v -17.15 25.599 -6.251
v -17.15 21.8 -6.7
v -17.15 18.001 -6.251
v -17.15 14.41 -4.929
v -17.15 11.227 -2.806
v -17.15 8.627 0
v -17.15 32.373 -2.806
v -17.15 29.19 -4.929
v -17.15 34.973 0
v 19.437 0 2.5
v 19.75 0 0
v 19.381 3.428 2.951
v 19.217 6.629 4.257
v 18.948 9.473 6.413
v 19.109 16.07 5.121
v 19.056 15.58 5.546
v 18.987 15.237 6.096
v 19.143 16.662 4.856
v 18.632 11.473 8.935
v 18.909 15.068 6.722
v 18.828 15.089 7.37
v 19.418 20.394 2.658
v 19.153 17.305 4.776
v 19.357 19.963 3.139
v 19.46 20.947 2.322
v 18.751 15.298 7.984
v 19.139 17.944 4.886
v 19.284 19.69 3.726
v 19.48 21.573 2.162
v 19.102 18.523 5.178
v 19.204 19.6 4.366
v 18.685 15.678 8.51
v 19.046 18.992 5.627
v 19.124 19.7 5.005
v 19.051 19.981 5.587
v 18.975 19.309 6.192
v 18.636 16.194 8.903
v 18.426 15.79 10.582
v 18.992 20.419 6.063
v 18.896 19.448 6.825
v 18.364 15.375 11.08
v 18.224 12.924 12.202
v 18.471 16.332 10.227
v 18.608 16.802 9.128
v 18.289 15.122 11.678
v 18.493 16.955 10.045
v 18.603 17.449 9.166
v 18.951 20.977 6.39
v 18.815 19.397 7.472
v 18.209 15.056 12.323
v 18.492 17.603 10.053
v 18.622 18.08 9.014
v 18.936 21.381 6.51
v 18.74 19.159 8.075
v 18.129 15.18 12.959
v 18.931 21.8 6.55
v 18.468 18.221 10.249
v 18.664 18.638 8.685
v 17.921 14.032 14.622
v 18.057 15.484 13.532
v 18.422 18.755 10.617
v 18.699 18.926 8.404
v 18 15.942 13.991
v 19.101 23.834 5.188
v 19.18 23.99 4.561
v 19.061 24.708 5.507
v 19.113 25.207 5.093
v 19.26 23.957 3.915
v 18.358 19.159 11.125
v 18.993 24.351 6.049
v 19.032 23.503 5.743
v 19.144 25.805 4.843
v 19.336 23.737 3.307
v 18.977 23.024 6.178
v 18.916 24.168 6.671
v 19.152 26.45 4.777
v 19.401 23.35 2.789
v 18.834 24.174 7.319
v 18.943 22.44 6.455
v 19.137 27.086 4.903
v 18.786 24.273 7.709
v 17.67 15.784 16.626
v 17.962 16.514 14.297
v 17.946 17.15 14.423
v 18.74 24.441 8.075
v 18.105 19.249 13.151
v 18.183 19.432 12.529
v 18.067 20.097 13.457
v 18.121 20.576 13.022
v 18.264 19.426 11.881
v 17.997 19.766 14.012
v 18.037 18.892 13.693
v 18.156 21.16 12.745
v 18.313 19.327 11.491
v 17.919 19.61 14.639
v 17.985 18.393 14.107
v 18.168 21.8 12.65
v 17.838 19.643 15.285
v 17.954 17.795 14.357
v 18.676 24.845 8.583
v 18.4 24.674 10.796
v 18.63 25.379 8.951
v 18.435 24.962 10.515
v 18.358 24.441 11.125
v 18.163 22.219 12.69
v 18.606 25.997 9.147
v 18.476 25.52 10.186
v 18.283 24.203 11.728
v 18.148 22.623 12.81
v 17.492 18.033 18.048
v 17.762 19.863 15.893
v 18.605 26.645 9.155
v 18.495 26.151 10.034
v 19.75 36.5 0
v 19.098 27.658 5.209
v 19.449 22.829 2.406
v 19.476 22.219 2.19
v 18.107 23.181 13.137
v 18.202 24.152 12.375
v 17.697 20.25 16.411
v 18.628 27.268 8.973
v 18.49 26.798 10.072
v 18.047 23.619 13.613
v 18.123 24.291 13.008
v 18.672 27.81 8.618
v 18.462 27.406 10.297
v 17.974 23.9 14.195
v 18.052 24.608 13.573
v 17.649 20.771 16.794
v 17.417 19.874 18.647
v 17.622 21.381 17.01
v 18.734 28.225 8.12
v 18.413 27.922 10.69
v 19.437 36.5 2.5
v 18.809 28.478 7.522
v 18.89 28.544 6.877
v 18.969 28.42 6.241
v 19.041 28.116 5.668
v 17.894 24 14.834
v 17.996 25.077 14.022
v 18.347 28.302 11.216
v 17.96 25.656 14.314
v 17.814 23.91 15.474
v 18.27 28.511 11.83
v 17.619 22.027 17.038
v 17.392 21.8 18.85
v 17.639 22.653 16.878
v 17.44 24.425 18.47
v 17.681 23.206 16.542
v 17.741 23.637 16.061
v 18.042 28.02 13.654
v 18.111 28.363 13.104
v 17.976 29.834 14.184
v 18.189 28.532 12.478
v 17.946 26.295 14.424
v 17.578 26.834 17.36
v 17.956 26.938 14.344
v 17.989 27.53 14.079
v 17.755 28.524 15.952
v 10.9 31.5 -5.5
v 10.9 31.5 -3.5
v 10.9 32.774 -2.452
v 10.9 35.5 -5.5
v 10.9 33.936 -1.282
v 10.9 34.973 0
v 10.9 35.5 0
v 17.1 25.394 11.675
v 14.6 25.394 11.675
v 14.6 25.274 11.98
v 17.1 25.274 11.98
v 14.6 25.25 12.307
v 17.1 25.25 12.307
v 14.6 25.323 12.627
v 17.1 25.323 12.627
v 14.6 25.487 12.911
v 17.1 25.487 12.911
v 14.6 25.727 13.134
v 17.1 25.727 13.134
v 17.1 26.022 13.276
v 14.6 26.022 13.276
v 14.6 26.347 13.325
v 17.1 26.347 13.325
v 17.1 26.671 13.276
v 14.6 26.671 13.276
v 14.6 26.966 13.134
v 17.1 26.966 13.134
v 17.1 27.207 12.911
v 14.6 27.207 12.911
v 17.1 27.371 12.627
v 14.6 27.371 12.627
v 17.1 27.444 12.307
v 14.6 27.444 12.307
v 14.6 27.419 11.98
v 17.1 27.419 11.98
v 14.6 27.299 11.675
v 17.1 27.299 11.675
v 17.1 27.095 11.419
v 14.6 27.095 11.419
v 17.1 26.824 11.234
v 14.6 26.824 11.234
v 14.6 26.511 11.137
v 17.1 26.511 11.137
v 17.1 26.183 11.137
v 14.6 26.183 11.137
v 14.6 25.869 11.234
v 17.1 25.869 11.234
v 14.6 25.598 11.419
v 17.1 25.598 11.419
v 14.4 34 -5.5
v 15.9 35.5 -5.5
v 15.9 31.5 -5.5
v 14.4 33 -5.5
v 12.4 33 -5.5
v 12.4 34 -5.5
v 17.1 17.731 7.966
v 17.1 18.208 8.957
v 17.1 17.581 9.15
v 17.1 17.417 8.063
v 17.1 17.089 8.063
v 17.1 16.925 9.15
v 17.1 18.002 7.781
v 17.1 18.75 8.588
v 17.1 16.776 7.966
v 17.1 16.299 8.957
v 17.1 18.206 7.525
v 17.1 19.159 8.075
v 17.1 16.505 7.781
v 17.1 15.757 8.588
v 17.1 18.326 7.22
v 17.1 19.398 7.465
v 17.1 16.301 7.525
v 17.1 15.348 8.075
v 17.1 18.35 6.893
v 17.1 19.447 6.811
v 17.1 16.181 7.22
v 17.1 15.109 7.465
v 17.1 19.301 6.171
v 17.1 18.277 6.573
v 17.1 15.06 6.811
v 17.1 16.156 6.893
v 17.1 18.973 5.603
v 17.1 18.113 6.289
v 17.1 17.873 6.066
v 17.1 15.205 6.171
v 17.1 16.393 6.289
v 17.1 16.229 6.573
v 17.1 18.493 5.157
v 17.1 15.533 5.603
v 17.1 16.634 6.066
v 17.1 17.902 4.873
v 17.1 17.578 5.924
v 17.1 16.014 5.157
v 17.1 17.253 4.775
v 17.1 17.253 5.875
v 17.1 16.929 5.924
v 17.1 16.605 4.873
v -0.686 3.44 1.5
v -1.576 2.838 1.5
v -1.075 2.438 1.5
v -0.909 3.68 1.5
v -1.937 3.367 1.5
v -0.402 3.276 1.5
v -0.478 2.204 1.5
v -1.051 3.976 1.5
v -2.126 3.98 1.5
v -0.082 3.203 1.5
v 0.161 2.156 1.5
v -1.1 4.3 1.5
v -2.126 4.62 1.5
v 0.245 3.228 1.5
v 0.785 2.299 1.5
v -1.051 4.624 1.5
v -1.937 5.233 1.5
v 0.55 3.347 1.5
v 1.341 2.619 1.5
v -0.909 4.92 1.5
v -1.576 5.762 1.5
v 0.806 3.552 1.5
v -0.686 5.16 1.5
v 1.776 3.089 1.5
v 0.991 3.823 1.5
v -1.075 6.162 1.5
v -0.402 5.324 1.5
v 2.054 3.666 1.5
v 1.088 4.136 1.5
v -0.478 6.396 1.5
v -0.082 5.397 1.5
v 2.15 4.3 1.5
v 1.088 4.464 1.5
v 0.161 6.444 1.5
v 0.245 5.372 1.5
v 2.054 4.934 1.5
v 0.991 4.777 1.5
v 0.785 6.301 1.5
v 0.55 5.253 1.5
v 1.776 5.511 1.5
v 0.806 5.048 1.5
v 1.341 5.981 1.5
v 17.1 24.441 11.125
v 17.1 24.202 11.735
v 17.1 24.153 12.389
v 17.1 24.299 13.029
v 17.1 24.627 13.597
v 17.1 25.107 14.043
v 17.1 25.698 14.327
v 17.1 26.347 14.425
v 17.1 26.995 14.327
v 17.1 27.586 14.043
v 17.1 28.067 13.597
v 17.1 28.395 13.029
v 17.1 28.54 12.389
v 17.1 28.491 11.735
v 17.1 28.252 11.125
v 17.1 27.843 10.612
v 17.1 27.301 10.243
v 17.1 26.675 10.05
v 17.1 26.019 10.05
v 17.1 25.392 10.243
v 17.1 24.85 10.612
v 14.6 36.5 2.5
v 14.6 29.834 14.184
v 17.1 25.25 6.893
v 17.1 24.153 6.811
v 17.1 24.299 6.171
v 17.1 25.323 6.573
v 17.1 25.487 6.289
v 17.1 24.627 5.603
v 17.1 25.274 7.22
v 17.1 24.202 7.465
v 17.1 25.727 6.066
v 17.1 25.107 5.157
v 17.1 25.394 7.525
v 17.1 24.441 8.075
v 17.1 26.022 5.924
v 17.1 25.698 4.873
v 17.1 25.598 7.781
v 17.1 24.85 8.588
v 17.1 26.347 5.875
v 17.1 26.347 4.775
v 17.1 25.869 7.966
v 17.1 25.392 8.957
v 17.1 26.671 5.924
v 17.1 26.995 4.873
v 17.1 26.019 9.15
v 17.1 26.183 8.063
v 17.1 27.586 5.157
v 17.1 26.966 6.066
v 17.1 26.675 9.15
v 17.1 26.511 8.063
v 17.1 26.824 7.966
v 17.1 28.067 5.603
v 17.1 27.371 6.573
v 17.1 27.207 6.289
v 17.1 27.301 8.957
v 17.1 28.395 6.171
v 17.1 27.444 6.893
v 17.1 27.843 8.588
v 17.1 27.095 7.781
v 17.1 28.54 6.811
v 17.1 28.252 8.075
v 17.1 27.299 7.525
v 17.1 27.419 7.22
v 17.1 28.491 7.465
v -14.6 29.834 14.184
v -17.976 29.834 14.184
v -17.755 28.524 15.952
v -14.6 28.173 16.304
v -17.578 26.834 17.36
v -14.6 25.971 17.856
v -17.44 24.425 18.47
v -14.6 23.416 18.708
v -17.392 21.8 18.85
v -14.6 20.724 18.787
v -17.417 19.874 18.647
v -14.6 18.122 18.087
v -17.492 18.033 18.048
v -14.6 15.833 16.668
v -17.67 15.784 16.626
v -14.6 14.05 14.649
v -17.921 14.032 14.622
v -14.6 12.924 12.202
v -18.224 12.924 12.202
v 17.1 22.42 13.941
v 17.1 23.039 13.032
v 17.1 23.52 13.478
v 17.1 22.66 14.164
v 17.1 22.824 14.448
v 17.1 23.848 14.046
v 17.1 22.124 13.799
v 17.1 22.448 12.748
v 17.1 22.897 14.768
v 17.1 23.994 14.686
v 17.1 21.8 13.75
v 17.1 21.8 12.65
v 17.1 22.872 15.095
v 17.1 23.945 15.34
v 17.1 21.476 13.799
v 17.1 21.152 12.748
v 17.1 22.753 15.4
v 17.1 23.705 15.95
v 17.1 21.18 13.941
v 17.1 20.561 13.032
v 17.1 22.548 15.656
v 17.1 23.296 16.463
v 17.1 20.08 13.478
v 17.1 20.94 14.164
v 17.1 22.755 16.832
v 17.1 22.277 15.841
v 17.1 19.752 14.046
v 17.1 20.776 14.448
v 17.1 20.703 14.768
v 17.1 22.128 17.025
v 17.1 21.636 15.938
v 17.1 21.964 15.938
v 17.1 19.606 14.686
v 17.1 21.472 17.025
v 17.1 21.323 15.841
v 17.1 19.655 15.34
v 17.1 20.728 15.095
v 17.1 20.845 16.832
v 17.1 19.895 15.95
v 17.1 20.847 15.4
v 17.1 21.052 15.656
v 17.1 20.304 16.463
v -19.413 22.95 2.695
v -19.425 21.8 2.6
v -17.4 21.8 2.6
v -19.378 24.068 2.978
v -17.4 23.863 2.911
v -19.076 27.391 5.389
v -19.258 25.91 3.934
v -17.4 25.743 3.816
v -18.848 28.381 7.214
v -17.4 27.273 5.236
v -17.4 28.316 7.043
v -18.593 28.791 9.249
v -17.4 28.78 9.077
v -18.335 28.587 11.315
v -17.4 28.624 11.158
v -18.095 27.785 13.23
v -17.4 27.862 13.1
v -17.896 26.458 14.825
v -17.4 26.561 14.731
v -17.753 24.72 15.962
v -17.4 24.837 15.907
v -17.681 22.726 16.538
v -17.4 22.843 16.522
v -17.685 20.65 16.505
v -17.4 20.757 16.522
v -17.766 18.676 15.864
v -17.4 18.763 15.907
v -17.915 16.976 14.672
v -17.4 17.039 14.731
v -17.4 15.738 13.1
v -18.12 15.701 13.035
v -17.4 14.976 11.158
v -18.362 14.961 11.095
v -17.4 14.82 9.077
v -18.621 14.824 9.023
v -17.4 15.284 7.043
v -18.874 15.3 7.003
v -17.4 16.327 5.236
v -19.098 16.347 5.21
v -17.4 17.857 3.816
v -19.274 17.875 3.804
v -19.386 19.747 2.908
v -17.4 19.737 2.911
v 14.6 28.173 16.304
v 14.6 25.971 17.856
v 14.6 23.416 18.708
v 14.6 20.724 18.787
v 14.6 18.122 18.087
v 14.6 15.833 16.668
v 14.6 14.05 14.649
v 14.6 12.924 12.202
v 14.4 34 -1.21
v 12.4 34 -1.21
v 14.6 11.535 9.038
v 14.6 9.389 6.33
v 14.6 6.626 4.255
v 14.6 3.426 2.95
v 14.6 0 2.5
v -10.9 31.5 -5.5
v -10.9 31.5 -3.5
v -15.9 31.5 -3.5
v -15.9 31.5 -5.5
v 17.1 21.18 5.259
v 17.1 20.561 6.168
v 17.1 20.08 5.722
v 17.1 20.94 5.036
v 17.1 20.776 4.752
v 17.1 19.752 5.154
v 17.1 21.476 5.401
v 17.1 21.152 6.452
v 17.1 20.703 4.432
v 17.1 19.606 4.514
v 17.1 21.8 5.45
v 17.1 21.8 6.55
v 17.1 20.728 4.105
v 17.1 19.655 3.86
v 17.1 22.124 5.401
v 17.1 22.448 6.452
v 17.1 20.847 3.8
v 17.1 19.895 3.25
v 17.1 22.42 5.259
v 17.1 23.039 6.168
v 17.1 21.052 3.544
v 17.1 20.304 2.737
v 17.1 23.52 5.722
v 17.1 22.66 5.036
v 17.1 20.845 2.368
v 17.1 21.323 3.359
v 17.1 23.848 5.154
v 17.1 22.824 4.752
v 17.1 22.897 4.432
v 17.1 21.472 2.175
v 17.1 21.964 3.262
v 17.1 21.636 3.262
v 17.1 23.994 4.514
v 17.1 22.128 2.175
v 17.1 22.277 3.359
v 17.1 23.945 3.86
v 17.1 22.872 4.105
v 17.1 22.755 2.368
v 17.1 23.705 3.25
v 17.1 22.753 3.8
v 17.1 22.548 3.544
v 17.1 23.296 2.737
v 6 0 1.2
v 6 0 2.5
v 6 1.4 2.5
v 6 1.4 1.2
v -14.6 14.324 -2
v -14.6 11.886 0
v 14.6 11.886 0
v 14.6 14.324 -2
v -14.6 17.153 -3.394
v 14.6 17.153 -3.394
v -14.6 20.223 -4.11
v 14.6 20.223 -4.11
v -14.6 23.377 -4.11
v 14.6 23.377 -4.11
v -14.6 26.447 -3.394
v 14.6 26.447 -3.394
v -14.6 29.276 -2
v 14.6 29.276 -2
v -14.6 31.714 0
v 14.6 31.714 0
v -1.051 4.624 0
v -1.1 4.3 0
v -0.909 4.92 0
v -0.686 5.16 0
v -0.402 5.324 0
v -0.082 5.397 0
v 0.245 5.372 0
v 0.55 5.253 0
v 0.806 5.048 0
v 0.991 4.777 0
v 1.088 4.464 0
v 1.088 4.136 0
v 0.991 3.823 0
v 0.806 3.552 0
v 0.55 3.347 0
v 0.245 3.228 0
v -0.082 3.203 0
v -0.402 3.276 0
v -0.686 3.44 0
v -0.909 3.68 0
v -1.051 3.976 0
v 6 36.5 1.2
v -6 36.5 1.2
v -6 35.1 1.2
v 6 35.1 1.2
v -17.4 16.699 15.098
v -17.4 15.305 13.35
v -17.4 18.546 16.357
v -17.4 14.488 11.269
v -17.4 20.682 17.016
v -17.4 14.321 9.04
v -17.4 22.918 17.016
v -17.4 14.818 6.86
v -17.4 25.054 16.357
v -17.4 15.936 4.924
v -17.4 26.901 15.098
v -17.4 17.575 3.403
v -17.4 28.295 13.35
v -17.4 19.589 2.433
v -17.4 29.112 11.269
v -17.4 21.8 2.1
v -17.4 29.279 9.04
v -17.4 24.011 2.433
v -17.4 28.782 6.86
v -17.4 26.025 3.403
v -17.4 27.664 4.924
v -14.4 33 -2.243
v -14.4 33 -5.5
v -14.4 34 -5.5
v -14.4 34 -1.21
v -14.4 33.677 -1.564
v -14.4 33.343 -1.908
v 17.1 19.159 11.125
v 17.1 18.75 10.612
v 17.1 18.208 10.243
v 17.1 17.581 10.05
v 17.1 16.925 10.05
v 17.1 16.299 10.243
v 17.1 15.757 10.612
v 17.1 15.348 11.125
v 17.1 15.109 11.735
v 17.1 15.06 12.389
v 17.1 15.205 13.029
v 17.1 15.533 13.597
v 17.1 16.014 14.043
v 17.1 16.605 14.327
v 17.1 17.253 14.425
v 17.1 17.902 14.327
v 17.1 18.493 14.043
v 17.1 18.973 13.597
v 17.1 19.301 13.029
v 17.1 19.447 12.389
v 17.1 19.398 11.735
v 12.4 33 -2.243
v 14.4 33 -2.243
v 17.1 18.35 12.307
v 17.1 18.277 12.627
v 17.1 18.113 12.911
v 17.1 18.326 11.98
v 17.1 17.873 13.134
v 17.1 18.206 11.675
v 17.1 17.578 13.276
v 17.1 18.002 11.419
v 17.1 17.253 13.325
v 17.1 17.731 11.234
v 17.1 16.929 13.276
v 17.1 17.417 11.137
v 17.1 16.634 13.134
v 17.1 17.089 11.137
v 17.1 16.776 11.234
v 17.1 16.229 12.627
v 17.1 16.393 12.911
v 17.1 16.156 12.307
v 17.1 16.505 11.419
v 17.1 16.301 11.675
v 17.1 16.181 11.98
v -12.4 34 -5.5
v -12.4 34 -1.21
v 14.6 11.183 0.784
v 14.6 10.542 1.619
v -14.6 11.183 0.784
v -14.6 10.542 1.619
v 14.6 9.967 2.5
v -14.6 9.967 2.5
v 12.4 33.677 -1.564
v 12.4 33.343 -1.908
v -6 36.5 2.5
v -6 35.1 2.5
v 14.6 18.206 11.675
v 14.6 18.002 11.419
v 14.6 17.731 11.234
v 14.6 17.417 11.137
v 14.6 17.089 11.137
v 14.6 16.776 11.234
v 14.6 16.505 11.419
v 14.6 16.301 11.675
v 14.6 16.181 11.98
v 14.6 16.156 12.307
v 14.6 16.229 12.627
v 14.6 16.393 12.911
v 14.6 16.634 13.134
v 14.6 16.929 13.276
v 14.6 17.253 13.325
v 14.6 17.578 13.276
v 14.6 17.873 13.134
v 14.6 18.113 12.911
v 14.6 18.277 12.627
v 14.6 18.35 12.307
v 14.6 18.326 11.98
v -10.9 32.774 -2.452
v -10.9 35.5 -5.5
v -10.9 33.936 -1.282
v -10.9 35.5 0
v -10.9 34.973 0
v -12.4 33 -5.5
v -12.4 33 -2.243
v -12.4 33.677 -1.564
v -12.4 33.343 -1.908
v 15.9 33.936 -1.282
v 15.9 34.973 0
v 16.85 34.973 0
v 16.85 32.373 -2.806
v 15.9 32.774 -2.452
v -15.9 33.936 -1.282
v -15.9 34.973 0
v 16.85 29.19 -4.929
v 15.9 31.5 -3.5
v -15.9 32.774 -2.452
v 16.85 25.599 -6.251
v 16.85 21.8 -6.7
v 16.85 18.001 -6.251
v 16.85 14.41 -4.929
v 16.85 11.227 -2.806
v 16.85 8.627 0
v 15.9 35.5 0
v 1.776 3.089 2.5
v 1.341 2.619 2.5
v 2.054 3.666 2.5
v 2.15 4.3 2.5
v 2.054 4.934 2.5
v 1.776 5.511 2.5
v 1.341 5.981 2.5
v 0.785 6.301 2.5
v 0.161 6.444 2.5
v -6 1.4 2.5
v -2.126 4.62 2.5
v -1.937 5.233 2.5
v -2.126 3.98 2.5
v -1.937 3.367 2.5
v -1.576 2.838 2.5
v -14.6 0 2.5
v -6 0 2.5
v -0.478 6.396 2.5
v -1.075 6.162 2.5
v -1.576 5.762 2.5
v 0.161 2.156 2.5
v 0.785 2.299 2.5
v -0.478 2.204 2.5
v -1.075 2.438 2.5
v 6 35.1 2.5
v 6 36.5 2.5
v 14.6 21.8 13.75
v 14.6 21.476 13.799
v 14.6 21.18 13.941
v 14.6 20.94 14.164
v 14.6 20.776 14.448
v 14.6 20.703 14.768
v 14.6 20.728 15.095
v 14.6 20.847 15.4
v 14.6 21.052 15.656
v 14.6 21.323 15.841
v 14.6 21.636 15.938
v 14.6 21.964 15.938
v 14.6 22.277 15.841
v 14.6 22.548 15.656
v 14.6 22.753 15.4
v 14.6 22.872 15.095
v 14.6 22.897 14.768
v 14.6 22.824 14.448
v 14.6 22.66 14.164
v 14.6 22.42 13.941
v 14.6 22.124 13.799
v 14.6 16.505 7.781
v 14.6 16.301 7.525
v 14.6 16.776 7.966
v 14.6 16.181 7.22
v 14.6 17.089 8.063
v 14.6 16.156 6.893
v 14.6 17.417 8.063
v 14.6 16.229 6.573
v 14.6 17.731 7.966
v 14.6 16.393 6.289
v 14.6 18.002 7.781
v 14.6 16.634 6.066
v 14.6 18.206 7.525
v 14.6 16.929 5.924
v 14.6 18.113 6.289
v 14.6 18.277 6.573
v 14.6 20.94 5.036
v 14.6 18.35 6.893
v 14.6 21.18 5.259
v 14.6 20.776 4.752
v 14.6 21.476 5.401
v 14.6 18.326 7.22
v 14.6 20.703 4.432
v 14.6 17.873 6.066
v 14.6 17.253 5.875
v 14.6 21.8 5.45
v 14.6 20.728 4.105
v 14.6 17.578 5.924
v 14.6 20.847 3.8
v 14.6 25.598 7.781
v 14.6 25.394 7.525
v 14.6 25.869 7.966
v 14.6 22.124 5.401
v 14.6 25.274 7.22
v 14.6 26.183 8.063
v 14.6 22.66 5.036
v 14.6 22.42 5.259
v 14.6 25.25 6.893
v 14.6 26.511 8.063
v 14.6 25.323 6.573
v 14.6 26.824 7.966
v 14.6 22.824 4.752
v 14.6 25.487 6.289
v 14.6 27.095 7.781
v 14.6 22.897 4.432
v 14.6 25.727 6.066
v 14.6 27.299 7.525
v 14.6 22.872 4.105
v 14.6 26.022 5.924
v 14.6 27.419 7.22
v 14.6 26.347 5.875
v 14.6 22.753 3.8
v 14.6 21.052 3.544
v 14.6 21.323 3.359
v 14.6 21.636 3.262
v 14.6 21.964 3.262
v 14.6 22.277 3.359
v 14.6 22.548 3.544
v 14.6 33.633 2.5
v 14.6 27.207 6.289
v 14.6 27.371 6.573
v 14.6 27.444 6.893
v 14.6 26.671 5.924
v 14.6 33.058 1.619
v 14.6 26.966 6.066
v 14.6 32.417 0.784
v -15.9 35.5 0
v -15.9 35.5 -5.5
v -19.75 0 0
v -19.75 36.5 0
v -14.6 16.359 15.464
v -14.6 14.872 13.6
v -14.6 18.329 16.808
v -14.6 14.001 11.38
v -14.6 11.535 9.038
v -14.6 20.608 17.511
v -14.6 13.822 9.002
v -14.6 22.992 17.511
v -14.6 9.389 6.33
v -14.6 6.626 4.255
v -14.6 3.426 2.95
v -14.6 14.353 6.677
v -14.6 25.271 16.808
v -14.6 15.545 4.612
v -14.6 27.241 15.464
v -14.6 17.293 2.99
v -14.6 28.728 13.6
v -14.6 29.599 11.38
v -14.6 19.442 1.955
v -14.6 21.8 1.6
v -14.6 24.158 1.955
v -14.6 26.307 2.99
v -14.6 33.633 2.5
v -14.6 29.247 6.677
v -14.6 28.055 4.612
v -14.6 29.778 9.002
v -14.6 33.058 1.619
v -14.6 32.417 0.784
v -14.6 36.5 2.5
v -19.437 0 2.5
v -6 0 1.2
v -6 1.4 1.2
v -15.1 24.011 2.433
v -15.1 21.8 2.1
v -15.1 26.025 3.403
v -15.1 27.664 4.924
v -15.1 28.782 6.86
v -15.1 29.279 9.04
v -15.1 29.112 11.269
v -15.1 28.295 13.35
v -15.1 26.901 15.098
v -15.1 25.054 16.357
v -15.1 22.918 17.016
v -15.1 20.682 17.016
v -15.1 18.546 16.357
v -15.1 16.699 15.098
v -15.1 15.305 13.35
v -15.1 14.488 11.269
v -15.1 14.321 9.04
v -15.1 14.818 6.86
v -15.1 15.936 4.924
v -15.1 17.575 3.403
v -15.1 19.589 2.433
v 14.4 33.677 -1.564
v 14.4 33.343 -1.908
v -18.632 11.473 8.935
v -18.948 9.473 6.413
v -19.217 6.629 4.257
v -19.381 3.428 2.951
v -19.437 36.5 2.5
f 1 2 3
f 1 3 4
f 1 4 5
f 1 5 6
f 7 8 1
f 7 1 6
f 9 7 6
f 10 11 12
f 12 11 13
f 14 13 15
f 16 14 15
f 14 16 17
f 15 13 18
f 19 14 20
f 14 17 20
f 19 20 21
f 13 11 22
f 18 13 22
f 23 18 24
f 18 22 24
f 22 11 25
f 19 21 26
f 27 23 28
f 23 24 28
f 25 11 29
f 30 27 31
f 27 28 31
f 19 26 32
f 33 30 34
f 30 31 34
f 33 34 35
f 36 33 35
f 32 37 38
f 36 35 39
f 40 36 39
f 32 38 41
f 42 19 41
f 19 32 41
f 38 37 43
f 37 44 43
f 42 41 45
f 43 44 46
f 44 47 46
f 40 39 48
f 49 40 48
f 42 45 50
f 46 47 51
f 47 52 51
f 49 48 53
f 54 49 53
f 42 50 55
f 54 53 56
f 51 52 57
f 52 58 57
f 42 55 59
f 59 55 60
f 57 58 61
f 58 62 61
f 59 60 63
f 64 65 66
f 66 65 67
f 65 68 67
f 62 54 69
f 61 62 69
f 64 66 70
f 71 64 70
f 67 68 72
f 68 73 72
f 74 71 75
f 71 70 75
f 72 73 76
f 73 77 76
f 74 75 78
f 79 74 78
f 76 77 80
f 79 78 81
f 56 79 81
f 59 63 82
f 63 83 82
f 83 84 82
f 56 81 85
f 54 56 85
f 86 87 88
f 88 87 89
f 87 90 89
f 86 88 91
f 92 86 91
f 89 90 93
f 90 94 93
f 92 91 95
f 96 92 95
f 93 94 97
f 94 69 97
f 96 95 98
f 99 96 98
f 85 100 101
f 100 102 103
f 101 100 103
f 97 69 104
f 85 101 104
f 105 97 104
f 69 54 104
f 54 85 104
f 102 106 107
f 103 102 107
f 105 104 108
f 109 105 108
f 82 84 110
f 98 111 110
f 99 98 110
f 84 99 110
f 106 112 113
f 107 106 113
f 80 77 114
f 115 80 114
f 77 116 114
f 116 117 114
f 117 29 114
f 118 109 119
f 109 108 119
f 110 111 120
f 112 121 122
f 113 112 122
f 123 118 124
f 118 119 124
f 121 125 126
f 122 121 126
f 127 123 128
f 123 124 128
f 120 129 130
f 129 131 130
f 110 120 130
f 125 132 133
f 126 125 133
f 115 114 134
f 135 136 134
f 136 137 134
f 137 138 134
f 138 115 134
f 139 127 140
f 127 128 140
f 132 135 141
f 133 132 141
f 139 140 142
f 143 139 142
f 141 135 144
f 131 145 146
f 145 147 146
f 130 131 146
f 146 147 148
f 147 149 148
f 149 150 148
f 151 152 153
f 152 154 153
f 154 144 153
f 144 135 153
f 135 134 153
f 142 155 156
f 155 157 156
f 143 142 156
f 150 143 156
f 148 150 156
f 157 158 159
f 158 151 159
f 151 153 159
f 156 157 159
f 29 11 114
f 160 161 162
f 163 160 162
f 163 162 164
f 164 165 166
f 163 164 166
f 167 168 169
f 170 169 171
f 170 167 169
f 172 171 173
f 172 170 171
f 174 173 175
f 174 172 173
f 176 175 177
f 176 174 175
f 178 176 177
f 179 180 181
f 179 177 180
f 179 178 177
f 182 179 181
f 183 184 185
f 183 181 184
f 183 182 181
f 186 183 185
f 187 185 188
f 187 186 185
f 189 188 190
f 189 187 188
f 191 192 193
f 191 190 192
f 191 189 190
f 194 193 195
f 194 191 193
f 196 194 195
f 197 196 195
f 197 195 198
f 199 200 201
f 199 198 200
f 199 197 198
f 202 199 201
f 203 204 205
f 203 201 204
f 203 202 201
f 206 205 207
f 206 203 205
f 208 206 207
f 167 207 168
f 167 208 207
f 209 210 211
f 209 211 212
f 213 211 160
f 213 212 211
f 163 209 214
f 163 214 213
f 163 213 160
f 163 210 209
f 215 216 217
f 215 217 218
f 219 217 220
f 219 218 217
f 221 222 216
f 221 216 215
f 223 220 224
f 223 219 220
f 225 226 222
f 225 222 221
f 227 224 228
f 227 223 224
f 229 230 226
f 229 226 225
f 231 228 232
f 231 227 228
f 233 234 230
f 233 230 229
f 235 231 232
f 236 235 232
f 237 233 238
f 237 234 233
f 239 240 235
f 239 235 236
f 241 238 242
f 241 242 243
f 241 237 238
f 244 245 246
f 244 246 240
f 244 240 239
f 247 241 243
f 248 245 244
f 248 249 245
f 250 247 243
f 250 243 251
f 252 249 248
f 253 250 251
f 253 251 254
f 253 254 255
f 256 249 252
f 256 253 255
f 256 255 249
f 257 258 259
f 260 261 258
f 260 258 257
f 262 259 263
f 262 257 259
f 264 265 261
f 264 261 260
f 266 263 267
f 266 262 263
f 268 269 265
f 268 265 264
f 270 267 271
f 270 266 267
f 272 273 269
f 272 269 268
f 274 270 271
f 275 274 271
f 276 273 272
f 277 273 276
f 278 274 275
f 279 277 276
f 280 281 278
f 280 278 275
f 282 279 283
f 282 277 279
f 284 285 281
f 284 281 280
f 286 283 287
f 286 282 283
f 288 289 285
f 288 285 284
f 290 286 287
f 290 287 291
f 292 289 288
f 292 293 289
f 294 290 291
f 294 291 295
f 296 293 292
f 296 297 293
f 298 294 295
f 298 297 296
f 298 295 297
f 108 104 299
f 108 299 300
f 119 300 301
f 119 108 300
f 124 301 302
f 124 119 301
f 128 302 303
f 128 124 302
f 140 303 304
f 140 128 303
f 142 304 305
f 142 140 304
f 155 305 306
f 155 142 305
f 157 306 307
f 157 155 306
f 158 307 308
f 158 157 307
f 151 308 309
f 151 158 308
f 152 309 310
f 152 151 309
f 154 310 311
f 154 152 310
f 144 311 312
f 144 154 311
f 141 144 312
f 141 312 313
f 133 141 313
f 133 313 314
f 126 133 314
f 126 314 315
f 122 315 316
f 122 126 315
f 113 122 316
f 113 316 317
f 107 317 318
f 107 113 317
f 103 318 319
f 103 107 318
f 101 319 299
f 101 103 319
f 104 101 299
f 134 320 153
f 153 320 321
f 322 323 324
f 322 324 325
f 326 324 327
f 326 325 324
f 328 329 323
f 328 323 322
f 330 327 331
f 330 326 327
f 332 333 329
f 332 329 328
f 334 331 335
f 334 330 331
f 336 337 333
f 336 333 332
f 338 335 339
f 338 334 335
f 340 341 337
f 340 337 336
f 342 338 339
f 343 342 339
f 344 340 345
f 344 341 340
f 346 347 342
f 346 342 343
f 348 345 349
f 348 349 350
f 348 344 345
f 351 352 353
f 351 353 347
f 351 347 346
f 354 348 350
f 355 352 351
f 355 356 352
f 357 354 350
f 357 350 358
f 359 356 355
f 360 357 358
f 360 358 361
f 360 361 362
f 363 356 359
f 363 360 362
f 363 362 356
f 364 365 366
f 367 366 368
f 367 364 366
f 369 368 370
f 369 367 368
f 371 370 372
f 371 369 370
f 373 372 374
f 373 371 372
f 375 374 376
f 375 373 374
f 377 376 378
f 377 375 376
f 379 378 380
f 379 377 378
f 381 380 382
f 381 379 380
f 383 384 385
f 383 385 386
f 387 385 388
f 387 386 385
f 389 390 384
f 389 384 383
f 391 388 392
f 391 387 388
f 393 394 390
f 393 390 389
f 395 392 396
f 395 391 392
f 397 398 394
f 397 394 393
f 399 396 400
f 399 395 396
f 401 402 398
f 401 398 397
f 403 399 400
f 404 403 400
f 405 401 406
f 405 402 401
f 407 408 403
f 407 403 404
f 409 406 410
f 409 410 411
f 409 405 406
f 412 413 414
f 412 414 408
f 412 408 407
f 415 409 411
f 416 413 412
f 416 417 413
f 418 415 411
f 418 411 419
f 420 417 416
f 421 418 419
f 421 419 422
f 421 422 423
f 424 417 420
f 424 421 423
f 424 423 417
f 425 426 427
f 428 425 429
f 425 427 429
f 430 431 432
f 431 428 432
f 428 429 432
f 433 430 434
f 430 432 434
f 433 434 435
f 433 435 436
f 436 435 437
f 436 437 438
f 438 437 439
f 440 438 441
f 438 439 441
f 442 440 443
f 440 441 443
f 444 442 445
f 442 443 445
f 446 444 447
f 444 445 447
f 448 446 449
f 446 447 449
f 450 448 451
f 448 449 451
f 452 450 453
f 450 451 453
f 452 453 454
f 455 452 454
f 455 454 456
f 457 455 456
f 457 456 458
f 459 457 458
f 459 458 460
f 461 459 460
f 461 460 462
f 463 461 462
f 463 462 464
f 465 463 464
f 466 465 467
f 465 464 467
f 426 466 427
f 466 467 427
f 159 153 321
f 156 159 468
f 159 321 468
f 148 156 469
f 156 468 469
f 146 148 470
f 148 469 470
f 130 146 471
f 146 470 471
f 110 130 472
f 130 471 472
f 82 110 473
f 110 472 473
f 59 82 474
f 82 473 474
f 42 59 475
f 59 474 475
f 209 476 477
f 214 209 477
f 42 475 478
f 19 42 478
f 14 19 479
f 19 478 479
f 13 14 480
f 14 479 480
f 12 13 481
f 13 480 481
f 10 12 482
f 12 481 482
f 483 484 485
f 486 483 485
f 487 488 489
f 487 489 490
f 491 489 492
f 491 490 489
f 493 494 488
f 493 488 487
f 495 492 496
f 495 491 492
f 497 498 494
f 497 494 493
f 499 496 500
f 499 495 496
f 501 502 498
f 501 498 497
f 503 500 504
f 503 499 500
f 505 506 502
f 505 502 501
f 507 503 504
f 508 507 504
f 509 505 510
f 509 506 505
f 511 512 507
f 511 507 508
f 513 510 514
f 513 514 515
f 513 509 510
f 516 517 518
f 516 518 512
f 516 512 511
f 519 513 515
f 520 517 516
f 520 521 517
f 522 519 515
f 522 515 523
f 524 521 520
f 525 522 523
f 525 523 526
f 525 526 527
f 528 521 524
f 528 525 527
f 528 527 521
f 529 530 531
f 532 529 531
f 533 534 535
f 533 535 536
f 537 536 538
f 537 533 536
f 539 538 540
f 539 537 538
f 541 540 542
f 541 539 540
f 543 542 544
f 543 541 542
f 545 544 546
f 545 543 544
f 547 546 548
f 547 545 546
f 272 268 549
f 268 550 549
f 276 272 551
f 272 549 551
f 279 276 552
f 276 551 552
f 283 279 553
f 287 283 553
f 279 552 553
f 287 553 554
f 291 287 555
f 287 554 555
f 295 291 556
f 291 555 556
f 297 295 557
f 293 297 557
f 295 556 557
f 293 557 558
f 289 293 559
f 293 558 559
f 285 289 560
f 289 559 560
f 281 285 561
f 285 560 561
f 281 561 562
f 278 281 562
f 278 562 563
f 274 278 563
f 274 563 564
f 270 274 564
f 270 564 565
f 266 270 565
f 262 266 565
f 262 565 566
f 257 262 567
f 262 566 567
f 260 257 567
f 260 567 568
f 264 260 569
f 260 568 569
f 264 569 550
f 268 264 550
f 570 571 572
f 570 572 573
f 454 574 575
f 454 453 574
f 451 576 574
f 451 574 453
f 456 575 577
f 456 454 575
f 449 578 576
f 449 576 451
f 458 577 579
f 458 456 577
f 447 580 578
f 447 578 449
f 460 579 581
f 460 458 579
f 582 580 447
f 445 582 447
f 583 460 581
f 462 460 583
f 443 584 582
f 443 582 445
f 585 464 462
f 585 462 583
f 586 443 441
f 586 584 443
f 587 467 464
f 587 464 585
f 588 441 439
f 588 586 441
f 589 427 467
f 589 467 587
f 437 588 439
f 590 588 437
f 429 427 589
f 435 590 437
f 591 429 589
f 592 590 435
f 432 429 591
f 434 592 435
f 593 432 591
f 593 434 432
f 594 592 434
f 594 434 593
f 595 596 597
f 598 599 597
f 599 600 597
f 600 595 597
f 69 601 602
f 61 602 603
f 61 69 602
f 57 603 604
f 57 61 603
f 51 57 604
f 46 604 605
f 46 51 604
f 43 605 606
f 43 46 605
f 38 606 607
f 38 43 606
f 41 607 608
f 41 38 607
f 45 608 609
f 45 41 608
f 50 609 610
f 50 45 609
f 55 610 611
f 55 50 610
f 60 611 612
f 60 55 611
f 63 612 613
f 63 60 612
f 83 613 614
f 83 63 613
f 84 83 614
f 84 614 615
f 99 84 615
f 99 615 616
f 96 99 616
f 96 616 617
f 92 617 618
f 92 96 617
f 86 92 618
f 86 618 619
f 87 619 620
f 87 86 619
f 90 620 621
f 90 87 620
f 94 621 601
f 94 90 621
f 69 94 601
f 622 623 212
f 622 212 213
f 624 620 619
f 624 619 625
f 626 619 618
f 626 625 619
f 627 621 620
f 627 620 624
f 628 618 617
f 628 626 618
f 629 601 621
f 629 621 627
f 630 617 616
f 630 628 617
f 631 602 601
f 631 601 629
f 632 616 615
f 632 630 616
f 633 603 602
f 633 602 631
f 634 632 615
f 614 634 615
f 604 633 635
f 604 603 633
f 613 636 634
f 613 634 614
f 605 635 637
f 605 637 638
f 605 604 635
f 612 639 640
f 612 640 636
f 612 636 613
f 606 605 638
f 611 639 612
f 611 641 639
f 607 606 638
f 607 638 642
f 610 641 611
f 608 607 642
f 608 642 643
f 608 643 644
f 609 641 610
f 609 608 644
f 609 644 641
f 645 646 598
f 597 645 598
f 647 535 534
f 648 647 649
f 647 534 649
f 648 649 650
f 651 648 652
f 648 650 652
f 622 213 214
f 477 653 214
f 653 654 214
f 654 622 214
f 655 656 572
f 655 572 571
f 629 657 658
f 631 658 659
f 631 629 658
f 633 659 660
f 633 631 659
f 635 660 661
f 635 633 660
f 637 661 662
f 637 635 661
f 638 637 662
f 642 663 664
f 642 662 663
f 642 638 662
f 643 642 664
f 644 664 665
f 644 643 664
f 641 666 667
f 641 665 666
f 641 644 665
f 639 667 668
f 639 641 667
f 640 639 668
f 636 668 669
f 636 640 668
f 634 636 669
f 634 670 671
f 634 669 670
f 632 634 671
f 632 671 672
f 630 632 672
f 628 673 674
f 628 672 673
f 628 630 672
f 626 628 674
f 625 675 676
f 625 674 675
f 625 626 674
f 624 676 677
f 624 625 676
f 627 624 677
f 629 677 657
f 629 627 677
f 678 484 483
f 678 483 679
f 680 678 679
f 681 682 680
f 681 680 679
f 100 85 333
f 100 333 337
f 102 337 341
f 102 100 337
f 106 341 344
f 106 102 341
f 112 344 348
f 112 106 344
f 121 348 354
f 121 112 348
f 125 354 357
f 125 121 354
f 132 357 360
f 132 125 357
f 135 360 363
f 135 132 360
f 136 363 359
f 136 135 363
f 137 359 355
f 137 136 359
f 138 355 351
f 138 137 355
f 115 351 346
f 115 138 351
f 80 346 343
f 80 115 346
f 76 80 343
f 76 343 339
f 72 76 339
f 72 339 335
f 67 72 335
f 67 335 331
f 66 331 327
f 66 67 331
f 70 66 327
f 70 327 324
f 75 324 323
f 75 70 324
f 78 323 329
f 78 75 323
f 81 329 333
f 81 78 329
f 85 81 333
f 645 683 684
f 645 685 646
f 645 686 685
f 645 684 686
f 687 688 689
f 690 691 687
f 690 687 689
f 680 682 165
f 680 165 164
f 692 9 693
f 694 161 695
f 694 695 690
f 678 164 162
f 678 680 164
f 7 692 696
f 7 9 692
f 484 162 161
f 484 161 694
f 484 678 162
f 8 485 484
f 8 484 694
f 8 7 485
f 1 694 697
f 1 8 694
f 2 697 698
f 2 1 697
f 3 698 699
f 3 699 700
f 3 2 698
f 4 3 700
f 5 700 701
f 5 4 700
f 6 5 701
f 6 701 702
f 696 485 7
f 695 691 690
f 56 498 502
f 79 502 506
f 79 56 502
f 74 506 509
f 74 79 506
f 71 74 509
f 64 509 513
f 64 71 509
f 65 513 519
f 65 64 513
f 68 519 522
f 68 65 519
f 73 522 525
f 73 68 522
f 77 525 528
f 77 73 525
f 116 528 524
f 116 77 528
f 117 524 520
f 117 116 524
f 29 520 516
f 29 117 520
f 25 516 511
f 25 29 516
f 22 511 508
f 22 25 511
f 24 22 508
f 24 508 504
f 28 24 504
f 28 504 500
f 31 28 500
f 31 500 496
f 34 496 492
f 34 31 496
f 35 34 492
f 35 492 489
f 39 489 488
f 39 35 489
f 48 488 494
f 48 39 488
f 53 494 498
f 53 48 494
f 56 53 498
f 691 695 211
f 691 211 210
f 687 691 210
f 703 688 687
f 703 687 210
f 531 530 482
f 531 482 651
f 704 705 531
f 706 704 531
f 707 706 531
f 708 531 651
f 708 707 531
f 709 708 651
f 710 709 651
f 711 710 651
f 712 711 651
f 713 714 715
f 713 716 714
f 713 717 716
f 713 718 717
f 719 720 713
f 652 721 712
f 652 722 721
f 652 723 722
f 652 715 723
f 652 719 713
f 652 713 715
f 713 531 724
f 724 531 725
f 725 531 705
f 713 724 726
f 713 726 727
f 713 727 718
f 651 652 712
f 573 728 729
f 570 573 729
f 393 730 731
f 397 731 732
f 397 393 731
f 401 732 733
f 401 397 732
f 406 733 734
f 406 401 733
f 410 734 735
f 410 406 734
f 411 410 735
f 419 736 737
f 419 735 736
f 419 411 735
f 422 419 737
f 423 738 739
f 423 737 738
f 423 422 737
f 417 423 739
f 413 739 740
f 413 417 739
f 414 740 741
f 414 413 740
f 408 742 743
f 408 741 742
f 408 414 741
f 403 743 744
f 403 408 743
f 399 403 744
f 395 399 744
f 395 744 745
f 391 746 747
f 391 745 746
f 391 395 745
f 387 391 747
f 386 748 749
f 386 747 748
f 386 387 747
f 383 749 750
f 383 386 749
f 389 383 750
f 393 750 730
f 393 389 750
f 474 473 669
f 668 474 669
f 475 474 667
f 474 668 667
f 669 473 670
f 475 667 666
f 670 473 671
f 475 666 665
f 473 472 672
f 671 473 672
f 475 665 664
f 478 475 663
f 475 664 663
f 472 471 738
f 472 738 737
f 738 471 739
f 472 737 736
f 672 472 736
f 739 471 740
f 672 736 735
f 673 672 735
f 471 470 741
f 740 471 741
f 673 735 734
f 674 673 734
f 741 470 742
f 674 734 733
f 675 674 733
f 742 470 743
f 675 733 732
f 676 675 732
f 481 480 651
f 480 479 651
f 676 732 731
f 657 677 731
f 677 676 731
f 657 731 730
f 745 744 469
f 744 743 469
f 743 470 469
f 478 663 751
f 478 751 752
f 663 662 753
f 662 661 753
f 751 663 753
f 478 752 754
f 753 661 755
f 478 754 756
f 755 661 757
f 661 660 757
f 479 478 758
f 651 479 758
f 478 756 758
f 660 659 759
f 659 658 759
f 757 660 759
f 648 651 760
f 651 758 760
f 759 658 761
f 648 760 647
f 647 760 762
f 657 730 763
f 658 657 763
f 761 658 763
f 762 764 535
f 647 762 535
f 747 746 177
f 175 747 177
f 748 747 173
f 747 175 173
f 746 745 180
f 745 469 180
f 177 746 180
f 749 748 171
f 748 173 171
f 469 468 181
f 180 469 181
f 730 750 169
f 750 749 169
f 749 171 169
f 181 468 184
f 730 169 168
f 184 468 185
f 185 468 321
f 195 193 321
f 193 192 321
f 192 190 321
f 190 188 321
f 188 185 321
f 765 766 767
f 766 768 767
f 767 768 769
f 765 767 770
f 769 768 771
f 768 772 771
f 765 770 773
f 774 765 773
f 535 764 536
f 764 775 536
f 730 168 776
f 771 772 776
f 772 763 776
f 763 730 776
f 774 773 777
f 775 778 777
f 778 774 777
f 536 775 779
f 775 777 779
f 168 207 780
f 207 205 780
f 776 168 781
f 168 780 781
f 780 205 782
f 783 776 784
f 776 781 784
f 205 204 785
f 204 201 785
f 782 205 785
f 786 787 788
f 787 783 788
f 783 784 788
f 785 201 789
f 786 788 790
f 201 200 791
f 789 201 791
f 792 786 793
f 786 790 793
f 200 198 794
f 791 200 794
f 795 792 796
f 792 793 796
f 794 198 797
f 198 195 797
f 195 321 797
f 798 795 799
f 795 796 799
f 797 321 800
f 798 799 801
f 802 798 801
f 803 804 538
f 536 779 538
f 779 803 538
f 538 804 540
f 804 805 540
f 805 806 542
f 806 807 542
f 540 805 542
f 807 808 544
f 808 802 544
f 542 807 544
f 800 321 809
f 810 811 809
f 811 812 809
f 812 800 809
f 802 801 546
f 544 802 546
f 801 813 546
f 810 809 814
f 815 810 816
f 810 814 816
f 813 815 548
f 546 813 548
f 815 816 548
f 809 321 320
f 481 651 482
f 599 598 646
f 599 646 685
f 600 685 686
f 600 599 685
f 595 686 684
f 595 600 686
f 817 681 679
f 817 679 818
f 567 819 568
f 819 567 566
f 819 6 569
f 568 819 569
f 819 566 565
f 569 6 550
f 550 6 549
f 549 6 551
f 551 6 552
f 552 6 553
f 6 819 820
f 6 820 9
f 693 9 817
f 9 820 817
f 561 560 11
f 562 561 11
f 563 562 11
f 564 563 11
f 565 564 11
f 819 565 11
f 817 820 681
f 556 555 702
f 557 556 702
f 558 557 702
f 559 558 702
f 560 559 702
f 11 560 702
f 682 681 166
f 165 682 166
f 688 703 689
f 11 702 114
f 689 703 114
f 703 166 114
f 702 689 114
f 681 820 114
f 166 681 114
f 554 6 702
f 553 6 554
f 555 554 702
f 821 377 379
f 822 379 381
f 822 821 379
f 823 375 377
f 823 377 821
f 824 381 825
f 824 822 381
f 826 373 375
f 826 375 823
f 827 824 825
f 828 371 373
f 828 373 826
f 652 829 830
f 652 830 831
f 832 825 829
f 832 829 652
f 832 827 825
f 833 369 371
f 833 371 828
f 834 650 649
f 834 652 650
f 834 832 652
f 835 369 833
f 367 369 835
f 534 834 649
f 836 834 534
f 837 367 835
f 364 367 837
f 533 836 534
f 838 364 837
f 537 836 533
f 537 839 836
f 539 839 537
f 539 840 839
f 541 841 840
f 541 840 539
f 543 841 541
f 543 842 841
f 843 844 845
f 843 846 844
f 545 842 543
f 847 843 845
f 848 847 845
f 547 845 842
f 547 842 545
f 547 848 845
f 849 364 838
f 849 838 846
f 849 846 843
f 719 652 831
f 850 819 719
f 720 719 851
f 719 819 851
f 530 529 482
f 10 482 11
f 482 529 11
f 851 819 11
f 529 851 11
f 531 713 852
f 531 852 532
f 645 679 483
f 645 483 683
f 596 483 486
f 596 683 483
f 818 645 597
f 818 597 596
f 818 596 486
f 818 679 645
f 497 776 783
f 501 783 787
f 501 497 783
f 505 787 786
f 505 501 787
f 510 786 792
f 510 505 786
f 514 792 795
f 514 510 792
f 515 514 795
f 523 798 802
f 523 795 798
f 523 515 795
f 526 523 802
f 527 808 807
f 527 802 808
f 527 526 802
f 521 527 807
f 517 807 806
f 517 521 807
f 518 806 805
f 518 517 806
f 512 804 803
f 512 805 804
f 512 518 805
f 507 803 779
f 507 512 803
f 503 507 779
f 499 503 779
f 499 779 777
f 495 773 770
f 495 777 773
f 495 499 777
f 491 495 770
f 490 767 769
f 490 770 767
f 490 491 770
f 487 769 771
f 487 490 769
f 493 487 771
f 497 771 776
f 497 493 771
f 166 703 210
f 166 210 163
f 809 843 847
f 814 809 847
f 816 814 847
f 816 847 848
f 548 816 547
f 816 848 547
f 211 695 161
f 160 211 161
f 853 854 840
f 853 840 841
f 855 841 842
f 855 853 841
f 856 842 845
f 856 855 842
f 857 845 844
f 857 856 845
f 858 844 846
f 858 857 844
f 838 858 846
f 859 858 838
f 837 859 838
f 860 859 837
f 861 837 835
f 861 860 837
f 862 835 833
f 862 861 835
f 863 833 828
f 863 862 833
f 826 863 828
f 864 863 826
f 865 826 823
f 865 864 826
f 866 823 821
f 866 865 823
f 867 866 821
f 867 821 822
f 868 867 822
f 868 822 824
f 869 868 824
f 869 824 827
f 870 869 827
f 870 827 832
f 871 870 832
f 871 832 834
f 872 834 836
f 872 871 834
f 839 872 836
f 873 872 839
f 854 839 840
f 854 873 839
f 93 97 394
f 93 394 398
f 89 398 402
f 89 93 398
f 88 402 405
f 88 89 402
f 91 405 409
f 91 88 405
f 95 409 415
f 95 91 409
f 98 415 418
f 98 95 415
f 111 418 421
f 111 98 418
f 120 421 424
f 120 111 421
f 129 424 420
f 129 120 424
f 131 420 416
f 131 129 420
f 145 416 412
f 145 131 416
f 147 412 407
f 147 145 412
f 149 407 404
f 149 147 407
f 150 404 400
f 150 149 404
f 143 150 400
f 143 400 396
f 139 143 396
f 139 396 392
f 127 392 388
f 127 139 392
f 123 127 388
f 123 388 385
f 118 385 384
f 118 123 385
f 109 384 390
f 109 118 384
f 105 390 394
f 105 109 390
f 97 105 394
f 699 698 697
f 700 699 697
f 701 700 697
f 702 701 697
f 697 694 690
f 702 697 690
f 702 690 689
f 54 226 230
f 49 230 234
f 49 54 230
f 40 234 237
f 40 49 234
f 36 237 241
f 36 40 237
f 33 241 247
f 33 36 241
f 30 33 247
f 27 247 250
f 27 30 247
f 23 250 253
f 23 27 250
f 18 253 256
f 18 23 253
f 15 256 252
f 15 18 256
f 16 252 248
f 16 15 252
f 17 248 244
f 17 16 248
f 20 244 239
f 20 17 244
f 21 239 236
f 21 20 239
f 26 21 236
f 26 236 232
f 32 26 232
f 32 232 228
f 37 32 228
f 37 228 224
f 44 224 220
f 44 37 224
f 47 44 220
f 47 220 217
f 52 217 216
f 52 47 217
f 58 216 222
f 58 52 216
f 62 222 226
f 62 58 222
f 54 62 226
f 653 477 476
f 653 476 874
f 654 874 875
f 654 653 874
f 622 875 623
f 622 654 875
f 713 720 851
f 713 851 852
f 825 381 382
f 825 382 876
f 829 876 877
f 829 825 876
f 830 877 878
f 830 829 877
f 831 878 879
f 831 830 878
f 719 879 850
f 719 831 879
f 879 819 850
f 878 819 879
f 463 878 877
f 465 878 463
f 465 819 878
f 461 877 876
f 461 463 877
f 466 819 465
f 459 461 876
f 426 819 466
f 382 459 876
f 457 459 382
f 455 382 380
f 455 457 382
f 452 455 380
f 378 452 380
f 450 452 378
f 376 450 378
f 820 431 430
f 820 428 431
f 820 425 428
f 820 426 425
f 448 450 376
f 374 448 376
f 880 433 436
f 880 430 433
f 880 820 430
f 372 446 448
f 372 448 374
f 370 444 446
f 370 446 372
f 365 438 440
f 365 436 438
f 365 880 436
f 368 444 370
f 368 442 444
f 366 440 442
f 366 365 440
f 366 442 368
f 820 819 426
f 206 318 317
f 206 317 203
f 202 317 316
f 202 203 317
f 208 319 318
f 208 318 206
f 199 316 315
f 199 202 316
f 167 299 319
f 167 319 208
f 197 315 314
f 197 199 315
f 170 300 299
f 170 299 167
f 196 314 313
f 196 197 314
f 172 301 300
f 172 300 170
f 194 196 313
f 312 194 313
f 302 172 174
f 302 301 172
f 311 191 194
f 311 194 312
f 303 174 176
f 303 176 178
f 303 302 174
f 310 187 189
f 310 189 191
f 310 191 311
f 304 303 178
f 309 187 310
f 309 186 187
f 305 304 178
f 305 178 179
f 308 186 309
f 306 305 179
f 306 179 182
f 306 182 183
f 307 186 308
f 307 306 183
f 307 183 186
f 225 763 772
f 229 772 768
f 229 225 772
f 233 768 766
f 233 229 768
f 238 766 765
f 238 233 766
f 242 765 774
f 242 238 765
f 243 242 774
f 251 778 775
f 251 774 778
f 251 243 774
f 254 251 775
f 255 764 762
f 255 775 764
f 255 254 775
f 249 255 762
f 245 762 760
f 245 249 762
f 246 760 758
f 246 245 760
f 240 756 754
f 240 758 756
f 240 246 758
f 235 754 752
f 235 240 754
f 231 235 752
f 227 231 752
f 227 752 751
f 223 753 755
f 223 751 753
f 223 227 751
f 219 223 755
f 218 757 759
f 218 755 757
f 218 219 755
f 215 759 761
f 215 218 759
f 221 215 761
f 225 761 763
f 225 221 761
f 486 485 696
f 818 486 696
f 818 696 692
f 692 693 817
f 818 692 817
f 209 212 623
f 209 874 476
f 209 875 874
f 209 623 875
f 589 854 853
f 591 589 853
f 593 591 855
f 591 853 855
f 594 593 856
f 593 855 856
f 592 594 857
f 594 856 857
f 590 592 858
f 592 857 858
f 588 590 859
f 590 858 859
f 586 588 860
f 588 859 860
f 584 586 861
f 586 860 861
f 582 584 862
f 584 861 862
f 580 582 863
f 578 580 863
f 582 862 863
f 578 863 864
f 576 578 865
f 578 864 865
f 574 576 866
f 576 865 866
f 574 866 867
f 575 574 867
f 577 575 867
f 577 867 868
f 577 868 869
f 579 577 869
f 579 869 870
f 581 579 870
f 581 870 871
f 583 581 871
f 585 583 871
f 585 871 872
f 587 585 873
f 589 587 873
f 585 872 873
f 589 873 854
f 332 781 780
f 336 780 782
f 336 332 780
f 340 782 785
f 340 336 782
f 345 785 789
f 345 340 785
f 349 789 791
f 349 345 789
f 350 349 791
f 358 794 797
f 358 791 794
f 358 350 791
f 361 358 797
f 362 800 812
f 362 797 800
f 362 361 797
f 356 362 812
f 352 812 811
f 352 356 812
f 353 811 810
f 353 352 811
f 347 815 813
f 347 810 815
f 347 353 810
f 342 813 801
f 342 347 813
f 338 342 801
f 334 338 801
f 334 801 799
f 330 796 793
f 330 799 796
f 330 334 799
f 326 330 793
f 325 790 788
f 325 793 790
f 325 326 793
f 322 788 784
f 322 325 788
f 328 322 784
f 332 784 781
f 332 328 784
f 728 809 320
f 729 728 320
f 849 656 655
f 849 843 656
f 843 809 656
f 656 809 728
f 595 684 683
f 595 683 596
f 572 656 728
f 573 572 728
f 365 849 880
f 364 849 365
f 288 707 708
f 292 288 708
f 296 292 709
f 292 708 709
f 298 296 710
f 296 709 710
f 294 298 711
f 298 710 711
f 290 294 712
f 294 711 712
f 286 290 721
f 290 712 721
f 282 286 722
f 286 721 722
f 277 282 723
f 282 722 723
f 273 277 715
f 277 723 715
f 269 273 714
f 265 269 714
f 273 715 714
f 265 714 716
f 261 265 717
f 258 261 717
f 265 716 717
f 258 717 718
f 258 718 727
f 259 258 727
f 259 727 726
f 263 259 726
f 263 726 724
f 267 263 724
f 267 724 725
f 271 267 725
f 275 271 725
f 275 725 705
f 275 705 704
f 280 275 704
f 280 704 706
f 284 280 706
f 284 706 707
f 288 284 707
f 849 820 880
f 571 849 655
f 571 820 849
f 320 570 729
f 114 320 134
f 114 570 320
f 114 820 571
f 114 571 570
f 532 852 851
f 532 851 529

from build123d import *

# Parameters (mm, degrees)
SKETCH_1_W                   = 39.5
SKETCH_1_H                   = 36.5
EXTRUDE_1_DEPTH              = 2.5
EXTRUDE_START                = -2.6
EXTRUDE_2_DEPTH              = 34
EXTRUDE_START_2              = 14.6
EXTRUDE_3_DEPTH              = 5.15
SKETCH_4_W                   = 5
SKETCH_4_H                   = 4
EXTRUDE_4_DEPTH              = 5.5
CUT_EXTRUDE_1_REACH          = 50.117
CUT_EXTRUDE_1_END_RADIUS     = 16.3
SKETCH_5_W                   = 2
SKETCH_5_H                   = 1
CUT_EXTRUDE_2_DEPTH          = 29.2
SKETCH_7_R                   = 7.5
CUT_EXTRUDE_3_DEPTH          = 2.8
SKETCH_8_R                   = 7
CUT_EXTRUDE_4_DEPTH          = 56.3867764
CHAMFER_1_SIZE               = 0.5
SKETCH_9_W                   = 12
SKETCH_9_H                   = 1.4
CUT_EXTRUDE_5_DEPTH          = 1.3
HOLE_WIZARD_M2_1_D           = 2.2
HOLE_WIZARD_M2_1_CBORE_D     = 4.3
HOLE_WIZARD_M2_1_CBORE_DEPTH = 1
SKETCH_10_W                  = 12
SKETCH_10_H                  = 1.4
CUT_EXTRUDE_6_DEPTH          = 1.3
PATTERN_CIRCULAR_1_COUNT     = 6
CUT_EXTRUDE_7_DEPTH          = 46.581081602
SKETCH_17_R                  = 13.8
CUT_EXTRUDE_8_DEPTH          = 29.2


with BuildPart() as part:
    # 草图1 → 凸台-拉伸1 (new body)
    with BuildSketch(Plane.XY):
        with Locations((0, 18.25)):
            Rectangle(SKETCH_1_W, SKETCH_1_H)
    extrude(amount=EXTRUDE_1_DEPTH)

    # 草图2 → 凸台-拉伸2 (add)
    with BuildSketch(Plane.ZY.offset(19.75).offset(EXTRUDE_START)):
        with BuildLine():
            Line((2.5, 7.127576887), (2.5, 36.472423113))
            ThreePointArc((2.5, 36.472423113), (1.216414342, 35.778751429), (0, 34.973078608))
            Line((0, 34.973078608), (0, 8.626921392))
            ThreePointArc((0, 8.626921392), (1.216414342, 7.821248571), (2.5, 7.127576887))
        make_face()
        with BuildLine():
            Line((0, 8.626921392), (0, 34.973078608))
            ThreePointArc((0, 34.973078608), (-6.7, 21.8), (0, 8.626921392))
        make_face()
    extrude(amount=-EXTRUDE_2_DEPTH)

    # 草图3 → 凸台-拉伸3 (add, through all)
    with BuildSketch(Plane(origin=(0, 0, 0), x_dir=(0, 0, -1), z_dir=(1, 0, 0)).offset(EXTRUDE_START_2)):
        with BuildLine():
            Line((-2.5, 36.5), (-14.183665706, 29.834457586))
            ThreePointArc((-14.183665706, 29.834457586), (-18.787148585, 20.723523862), (-12.202183107, 12.923562478))
            ThreePointArc((-12.202183107, 12.923562478), (-5.203778934, 8.073846044), (-2.5, 0))
            Line((-2.5, 0), (-2.5, 36.5))
        make_face()
    extrude_3 = extrude(amount=EXTRUDE_3_DEPTH)

    # 镜向1: 凸台-拉伸3 across plane
    add(extrude_3.mirror(Plane(origin=(0, 0, 0), x_dir=(0, 0, 1), z_dir=(1, 0, 0))))

    # 草图4 → 凸台-拉伸4 (add)
    with BuildSketch(Plane(origin=(0, 0, 0), x_dir=(-1, 0, 0), z_dir=(0, 0, -1))):
        with Locations((-13.4, 33.5)):
            Rectangle(SKETCH_4_W, SKETCH_4_H)
        with Locations((13.4, 33.5)):
            Rectangle(SKETCH_4_W, SKETCH_4_H)
    extrude(amount=EXTRUDE_4_DEPTH)

    # 切除-拉伸1: up to this cylinder (the profile starts outside it)
    cut_extrude_1_end = Plane(origin=(0, 21.8, 9.6), z_dir=(-1, 0, 0)) * Cylinder(CUT_EXTRUDE_1_END_RADIUS, 160.634, mode=Mode.PRIVATE)
    # 草图5 → 切除-拉伸1 (cut, up to the surface)
    with BuildSketch(Plane(origin=(0, 0, -5.5), x_dir=(-1, 0, 0), z_dir=(0, 0, -1)), mode=Mode.PRIVATE) as cut_extrude_1_sk1:
        with Locations((-13.4, 33.5)):
            Rectangle(SKETCH_5_W, SKETCH_5_H)
    cut_extrude_1_tool1 = extrude(cut_extrude_1_sk1.sketch, amount=-CUT_EXTRUDE_1_REACH, mode=Mode.PRIVATE) - cut_extrude_1_end
    add(cut_extrude_1_tool1.solids().sort_by_distance((13.4, 33.5, -5.5))[0], mode=Mode.SUBTRACT)
    # 草图5 → 切除-拉伸1 (cut, up to the surface)
    with BuildSketch(Plane(origin=(0, 0, -5.5), x_dir=(-1, 0, 0), z_dir=(0, 0, -1)), mode=Mode.PRIVATE) as cut_extrude_1_sk2:
        with Locations((13.4, 33.5)):
            Rectangle(SKETCH_5_W, SKETCH_5_H)
    cut_extrude_1_tool2 = extrude(cut_extrude_1_sk2.sketch, amount=-CUT_EXTRUDE_1_REACH, mode=Mode.PRIVATE) - cut_extrude_1_end
    add(cut_extrude_1_tool2.solids().sort_by_distance((-13.4, 33.5, -5.5))[0], mode=Mode.SUBTRACT)

    # 草图6 → 切除-拉伸2 (cut)
    with BuildSketch(Plane(origin=(-14.6, 0, 0), x_dir=(0, 0, -1), z_dir=(1, 0, 0))):
        with BuildLine():
            Line((0, 31.713626985), (0, 11.886373015))
            ThreePointArc((0, 11.886373015), (-23.4, 21.8), (0, 31.713626985))
        make_face()
    extrude(amount=CUT_EXTRUDE_2_DEPTH, mode=Mode.SUBTRACT)

    # 草图7 → 切除-拉伸3 (cut)
    with BuildSketch(Plane(origin=(-14.6, 0, 0), x_dir=(0, 0, -1), z_dir=(1, 0, 0))):
        with Locations((-9.6, 21.8)):
            Circle(SKETCH_7_R)
    extrude(amount=-CUT_EXTRUDE_3_DEPTH, mode=Mode.SUBTRACT)

    # 草图8 → 切除-拉伸4 (cut, through all)
    with BuildSketch(Plane(origin=(-17.4, 0, 0), x_dir=(0, 0, -1), z_dir=(1, 0, 0))):
        with Locations((-9.6, 21.8)):
            Circle(SKETCH_8_R)
    extrude(amount=-CUT_EXTRUDE_4_DEPTH, mode=Mode.SUBTRACT)

    # 倒角1
    chamfer_1_edges = [part.edges().sort_by_distance(p)[0] for p in [
        (-14.6, 21.8, 17.1),
    ]]
    chamfer(chamfer_1_edges, length=CHAMFER_1_SIZE)

    # 草图9 → 切除-拉伸5 (cut)
    with BuildSketch(Plane.XY.offset(2.5)):
        with Locations((0, 35.8)):
            Rectangle(SKETCH_9_W, SKETCH_9_H)
    extrude(amount=-CUT_EXTRUDE_5_DEPTH, mode=Mode.SUBTRACT)

    # M2 六角圆柱头螺钉的柱形沉头孔1 (through all)
    with Locations(Plane.XY.offset(2.5)):
        with Locations((0, 4.3)):
            CounterBoreHole(HOLE_WIZARD_M2_1_D / 2, HOLE_WIZARD_M2_1_CBORE_D / 2, HOLE_WIZARD_M2_1_CBORE_DEPTH)

    # 草图10 → 切除-拉伸6 (cut)
    with BuildSketch(Plane.XY.offset(2.5)):
        with Locations((0, 0.7)):
            Rectangle(SKETCH_10_W, SKETCH_10_H)
    extrude(amount=-CUT_EXTRUDE_6_DEPTH, mode=Mode.SUBTRACT)

    # 草图15 → M2 六角圆柱头螺钉的柱形沉头孔2 (revolve, cut)
    with BuildSketch(Plane(origin=(19.75, 21.8, 14.85), x_dir=(0, 0, -1), z_dir=(0, 1, 0))):
        Polygon((0, 0), (0, 7.860946681), (1.1, 7.2), (1.1, 2.65), (2.2, 2.65), (2.2, 0), align=None)
    hole_wizard_m2_2 = revolve(axis=Axis((26.1, 21.8, 14.85), (-1, 0, 0)), mode=Mode.SUBTRACT)

    # 阵列(圆周)1: M2 六角圆柱头螺钉的柱形沉头孔2 ×6 about axis
    pattern_circular_1_axis = Axis((0, 21.8, 9.6), (1, 0, 0))
    for i in range(1, PATTERN_CIRCULAR_1_COUNT):
        add(hole_wizard_m2_2.rotate(pattern_circular_1_axis, i * 360 / PATTERN_CIRCULAR_1_COUNT), mode=Mode.SUBTRACT)

    # 草图16 → 切除-拉伸7 (cut, through all)
    with BuildSketch(Plane(origin=(0, 36.5, 0), x_dir=(1, 0, 0), z_dir=(0, 1, 0))):
        Polygon((19.75, 0), (17.392084769, -18.85), (19.75, -18.85), align=None)
        Polygon((-17.392084769, -18.85), (-19.75, -18.85), (-19.75, 0), align=None)
    extrude(amount=-CUT_EXTRUDE_7_DEPTH, mode=Mode.SUBTRACT)

    # 草图17 → 切除-拉伸8 (cut)
    with BuildSketch(Plane(origin=(-14.6, 0, 0), x_dir=(0, 0, -1), z_dir=(1, 0, 0))):
        with Locations((-9.6, 21.8)):
            Circle(SKETCH_17_R)
    extrude(amount=CUT_EXTRUDE_8_DEPTH, mode=Mode.SUBTRACT)


solid = part.part
